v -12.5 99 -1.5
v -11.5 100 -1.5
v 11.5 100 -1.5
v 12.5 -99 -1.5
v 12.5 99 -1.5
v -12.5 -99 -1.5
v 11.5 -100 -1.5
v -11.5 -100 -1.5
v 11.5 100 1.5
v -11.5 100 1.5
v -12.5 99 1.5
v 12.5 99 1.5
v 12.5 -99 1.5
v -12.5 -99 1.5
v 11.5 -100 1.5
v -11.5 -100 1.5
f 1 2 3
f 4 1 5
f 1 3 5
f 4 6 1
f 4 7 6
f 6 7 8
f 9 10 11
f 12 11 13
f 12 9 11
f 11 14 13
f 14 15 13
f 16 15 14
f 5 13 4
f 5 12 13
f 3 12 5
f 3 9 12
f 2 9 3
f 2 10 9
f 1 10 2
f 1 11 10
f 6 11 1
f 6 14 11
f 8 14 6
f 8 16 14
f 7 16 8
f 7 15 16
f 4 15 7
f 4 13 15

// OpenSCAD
/*
 * Tao Steps Stamp
 */
 echo(version=version());

// logo = "steps.tao.black.small.png";
// logoy = 400; 
// logox = 607; 
logo = "footprint.small.png";
logoy = 200; 
logox = 200; 

module roundedRect(size, radius) {  
	linear_extrude(height=size.z, center=true) {
		offset(radius) offset(-radius) {
			square([size.x, size.y], center = true);
		}
	}
}


plateWidth = 25;
plateLength = 200;
plateThickNess = 3;
cornerRadius = 1;
imgStep = 18; // 31.5;
scale = 0.7;

molded = false; // Make a mold, or not

module printTheSteps(from, to) {
  for (i = [from : to]) {
    translate([0, (i * imgStep), /* 2 */ 3]) {
      scale([scale * (plateLength / 7) / logox, 
             scale * plateWidth / logoy, .02]) {
        //color("white") {
          rotate([0, 0, -0]) {
            surface(file=logo, invert=true, center=true);
          }
        //}
      }
    }
  }
}

//color("green") {
  difference() {  
    union() {
      if (molded) {
        difference() {
          // Base plate
          roundedRect([plateWidth, plateLength, plateThickNess], cornerRadius);
          // The footprints  
          printTheSteps(-4, 4);
        }
        // The frame around
        translate([0, 0, (plateThickNess / 1)]) {
          difference() {
            roundedRect([plateWidth, plateLength, plateThickNess], cornerRadius);
            roundedRect([plateWidth - 5, plateLength - 5, plateThickNess * 1.1], cornerRadius);
          }
        }
      } else {
        // Base plate
        roundedRect([plateWidth, plateLength, plateThickNess], cornerRadius);
        // The footprints  
        printTheSteps(-5, 5);
      }
    }
  }
//}
  
